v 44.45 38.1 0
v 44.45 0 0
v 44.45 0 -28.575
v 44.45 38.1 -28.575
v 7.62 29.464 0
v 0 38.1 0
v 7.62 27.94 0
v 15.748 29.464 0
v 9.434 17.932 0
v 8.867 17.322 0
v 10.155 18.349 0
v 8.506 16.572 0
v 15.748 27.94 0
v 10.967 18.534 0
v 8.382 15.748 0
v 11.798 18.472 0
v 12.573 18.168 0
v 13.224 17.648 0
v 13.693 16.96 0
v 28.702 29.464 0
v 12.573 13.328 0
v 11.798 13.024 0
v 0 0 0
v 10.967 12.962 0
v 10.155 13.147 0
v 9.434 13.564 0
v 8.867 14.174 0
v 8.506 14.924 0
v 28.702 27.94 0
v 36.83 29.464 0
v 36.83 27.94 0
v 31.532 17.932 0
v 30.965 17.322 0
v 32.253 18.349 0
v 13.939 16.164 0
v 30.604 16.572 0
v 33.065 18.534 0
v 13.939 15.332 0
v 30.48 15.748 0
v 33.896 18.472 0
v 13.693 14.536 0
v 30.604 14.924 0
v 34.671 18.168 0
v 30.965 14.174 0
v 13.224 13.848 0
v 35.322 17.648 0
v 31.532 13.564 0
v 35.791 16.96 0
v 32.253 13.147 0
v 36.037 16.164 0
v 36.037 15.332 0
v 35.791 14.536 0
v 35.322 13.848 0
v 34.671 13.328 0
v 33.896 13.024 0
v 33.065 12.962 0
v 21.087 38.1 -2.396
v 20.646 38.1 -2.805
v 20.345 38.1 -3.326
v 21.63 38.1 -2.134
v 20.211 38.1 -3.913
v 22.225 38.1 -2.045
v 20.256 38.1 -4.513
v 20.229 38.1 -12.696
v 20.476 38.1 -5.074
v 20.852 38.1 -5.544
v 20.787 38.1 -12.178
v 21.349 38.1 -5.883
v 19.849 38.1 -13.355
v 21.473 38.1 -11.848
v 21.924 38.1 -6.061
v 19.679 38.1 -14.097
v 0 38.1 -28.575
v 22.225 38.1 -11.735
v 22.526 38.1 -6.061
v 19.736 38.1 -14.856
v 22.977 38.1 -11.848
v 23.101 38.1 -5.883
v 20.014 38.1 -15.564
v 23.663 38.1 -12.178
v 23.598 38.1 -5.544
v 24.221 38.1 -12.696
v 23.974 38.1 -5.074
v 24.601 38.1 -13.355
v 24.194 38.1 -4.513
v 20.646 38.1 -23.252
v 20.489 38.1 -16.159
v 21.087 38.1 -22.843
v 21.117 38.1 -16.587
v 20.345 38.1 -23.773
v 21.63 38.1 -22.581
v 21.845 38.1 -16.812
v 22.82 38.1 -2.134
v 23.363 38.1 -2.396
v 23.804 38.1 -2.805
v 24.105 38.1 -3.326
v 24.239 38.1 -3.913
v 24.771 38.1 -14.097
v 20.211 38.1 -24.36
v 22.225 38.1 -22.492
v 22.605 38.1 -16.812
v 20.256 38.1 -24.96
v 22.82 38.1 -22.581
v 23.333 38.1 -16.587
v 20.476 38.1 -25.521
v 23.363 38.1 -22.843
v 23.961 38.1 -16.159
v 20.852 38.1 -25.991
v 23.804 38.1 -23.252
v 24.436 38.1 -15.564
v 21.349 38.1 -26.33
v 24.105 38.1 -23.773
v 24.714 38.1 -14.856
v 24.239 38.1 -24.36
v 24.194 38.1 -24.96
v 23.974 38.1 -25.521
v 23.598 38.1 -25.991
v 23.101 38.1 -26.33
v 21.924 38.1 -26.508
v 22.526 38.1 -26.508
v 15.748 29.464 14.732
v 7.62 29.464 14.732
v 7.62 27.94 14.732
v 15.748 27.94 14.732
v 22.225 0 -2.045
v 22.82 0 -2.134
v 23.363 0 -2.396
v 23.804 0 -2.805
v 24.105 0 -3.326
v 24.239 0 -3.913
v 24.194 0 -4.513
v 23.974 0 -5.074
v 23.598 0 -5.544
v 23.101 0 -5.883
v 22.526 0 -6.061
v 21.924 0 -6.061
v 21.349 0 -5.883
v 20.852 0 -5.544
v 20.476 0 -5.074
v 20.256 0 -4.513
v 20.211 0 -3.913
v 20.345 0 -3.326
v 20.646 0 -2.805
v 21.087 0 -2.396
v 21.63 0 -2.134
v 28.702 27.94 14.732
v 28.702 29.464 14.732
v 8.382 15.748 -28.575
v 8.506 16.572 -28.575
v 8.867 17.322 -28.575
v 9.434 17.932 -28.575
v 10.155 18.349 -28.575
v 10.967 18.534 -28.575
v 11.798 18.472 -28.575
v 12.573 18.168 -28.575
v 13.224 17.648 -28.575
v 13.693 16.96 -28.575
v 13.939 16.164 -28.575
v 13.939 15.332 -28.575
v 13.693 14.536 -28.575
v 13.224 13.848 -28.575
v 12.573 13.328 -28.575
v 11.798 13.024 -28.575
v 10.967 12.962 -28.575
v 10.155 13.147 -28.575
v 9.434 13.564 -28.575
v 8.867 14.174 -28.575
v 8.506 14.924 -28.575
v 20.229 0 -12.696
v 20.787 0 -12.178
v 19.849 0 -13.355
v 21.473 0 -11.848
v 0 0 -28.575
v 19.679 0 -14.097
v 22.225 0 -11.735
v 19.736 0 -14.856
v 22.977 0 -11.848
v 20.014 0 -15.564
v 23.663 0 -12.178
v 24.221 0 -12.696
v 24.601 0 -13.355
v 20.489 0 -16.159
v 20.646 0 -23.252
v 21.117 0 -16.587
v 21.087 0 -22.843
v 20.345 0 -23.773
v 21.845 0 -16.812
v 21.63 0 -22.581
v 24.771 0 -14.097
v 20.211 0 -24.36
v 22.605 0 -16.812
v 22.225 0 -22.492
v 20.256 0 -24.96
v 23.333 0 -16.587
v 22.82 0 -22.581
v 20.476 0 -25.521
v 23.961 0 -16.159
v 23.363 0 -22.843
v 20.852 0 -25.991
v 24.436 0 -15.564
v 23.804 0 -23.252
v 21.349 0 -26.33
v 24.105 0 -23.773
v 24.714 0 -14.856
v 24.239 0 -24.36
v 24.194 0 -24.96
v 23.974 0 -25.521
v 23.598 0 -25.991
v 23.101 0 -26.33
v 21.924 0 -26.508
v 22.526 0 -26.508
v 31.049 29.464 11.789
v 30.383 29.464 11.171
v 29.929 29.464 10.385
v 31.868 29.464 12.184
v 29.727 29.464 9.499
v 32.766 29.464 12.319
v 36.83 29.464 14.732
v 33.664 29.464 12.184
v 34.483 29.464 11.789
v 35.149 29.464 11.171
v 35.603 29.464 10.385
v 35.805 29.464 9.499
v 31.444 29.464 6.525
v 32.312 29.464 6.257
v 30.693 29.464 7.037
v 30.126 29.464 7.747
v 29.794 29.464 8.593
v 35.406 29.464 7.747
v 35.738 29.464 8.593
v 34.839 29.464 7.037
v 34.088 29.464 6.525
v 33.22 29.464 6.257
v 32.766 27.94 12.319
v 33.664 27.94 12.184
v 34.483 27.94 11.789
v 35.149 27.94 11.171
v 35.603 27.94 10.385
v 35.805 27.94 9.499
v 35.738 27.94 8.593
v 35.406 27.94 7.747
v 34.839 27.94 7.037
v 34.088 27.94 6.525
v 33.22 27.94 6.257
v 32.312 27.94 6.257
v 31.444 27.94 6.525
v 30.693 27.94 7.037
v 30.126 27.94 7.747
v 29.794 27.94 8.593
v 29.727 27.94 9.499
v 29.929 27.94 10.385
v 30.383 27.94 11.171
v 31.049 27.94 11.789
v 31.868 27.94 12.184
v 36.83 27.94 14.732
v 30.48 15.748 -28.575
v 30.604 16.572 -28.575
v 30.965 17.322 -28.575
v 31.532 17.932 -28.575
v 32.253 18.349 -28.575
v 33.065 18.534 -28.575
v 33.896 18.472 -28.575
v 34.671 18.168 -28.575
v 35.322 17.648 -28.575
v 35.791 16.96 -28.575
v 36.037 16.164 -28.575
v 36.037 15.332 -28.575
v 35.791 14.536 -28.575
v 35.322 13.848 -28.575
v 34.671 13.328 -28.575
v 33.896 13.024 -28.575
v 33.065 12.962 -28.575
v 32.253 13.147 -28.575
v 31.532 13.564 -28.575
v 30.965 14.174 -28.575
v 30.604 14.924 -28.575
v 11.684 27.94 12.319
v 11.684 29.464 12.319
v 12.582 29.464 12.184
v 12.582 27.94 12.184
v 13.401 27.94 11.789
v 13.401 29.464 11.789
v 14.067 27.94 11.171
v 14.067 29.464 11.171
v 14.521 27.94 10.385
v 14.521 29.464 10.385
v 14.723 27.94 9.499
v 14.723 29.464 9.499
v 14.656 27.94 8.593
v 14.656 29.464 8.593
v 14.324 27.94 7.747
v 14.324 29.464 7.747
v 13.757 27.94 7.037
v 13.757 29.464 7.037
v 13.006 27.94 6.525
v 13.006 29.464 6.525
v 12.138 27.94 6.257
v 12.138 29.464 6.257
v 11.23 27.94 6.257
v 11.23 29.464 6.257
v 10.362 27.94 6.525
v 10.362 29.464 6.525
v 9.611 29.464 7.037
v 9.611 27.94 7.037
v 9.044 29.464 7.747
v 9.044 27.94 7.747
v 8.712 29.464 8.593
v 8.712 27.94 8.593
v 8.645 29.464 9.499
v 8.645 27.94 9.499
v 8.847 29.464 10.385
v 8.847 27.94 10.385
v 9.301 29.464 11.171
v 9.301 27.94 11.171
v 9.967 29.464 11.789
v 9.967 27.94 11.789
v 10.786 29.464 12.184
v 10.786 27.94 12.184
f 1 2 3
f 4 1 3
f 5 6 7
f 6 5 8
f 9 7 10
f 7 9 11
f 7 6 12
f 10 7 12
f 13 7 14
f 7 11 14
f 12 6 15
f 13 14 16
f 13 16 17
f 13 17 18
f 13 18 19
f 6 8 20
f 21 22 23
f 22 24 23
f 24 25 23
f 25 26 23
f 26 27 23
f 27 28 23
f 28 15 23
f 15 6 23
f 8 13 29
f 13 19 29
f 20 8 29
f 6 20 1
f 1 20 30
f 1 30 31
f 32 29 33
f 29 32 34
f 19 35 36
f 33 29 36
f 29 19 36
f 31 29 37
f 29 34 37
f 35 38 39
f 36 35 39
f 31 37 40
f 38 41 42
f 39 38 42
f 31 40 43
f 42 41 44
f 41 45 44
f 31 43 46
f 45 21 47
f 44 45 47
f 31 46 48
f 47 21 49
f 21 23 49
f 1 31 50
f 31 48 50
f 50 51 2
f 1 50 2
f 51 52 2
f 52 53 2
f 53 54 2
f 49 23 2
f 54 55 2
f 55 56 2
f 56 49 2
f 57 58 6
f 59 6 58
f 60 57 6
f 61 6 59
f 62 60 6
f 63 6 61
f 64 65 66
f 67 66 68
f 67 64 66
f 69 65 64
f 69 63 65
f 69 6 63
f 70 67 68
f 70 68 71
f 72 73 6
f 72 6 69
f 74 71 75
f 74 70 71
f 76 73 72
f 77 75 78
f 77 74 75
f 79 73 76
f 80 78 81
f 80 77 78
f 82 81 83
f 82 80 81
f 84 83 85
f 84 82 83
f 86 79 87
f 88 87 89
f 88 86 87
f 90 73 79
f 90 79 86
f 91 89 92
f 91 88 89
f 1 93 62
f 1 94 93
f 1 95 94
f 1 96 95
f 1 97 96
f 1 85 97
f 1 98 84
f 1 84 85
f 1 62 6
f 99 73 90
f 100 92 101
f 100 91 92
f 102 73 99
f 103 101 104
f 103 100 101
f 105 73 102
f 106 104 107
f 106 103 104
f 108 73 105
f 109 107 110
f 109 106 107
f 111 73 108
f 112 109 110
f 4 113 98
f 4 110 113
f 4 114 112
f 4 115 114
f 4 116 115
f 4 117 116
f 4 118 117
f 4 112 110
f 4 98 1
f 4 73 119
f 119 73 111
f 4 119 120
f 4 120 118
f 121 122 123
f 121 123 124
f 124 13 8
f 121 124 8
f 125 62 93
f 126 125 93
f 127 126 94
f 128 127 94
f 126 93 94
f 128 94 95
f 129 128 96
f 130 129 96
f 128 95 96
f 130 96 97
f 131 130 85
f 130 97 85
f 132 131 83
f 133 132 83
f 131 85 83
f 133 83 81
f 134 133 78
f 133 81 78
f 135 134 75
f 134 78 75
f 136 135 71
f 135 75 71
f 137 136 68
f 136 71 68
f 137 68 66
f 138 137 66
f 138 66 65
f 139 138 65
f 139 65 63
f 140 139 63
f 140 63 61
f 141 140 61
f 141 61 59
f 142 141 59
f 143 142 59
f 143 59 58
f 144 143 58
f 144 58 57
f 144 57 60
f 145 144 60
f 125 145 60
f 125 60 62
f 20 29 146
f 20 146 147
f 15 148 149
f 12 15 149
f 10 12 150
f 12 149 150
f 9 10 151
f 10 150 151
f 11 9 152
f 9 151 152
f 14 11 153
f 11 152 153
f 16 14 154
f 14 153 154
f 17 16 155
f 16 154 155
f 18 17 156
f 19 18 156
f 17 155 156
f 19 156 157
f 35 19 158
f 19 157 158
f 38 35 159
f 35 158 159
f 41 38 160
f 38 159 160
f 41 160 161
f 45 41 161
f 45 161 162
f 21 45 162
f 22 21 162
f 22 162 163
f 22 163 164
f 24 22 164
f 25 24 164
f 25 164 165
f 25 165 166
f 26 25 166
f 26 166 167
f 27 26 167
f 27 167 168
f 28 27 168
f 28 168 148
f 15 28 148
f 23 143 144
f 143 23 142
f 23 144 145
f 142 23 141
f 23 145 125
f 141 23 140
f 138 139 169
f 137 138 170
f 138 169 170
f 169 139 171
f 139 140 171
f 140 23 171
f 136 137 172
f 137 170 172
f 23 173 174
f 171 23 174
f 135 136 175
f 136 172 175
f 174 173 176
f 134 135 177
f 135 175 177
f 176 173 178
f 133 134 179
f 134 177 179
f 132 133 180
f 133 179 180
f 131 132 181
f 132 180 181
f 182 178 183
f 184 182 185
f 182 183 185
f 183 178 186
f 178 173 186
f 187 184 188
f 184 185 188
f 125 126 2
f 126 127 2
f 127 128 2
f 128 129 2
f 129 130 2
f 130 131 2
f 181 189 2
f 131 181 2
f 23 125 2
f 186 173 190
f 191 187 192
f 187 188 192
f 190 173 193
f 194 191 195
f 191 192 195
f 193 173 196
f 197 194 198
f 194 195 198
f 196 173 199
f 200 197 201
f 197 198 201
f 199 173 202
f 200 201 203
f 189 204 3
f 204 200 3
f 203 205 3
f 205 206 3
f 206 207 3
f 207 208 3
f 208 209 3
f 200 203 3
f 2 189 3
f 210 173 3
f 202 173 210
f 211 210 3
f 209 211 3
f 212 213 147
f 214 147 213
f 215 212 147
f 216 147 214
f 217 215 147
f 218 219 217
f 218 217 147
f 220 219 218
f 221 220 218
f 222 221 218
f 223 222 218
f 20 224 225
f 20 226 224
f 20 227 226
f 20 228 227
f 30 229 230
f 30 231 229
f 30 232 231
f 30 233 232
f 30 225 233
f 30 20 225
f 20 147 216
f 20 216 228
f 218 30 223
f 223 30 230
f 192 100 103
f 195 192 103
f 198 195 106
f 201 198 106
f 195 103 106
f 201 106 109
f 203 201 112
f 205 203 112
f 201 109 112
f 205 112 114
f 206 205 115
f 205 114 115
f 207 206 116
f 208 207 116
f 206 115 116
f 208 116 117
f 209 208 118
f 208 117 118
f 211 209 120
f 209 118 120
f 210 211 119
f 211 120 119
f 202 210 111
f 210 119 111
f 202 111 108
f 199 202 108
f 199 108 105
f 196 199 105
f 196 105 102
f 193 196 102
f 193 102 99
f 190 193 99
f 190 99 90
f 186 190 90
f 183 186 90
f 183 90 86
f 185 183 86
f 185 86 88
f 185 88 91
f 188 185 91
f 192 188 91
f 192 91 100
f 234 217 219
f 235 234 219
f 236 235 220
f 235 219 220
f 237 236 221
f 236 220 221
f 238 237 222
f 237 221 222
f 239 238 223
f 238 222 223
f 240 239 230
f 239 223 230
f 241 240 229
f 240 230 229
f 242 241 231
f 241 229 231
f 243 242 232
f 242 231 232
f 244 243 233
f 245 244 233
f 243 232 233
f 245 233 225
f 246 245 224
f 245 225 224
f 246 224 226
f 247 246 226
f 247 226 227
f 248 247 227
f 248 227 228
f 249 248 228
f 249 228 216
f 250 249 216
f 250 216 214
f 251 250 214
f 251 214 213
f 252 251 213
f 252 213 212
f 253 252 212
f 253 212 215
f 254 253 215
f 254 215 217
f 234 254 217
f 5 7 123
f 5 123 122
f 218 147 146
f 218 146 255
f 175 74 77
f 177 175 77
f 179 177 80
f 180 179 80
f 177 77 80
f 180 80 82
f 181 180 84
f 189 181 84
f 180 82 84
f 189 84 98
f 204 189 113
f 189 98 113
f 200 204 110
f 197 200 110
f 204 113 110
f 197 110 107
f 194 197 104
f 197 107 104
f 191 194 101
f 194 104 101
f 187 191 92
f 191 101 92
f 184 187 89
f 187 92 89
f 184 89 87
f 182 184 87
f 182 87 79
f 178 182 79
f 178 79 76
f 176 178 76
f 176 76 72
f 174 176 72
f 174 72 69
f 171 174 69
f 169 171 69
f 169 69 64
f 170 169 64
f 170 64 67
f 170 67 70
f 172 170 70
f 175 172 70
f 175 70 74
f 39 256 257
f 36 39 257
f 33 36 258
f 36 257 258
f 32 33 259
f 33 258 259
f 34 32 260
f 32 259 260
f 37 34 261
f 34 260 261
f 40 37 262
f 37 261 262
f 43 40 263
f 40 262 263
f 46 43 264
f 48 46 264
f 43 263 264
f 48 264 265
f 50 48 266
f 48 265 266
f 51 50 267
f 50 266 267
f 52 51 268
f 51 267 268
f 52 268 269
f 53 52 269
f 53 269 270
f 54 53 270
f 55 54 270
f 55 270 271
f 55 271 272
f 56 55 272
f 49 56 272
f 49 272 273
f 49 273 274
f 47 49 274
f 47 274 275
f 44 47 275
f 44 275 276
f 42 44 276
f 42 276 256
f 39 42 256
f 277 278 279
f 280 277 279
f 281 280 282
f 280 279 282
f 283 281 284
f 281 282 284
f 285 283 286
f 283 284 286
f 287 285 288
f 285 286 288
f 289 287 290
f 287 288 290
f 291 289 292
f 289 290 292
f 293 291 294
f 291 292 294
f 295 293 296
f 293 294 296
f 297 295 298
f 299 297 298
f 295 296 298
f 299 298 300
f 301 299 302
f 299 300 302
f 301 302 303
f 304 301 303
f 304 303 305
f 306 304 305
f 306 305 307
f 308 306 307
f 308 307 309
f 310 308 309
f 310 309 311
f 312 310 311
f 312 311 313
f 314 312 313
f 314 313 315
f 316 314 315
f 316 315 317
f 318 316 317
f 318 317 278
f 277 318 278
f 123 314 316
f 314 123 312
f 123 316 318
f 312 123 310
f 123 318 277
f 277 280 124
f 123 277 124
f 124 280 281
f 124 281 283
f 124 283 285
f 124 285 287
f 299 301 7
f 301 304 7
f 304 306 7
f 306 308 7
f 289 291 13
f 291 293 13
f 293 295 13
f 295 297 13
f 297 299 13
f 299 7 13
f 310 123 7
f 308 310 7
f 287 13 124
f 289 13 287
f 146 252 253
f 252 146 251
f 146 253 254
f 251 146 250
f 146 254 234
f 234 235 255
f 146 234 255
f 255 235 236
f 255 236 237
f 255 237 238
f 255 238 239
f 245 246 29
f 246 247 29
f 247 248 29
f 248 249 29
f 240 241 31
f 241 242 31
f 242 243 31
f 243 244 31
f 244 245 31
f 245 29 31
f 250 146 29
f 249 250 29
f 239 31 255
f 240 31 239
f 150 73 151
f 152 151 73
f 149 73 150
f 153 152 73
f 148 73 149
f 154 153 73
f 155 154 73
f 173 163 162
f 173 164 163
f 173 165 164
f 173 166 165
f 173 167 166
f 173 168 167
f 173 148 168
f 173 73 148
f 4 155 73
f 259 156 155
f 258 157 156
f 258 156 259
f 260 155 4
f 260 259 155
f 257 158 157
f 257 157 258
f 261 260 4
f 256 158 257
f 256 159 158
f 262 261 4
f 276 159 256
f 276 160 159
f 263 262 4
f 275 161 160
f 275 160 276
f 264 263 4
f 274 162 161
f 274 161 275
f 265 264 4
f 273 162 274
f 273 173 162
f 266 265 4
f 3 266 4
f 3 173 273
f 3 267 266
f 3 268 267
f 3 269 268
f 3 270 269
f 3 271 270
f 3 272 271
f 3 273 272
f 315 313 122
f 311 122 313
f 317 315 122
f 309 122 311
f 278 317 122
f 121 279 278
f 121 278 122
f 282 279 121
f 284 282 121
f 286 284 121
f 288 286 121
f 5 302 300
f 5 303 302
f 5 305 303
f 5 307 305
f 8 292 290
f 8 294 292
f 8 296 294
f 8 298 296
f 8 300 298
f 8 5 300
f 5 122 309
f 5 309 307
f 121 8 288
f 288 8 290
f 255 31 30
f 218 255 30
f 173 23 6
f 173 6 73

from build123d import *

# Parameters (mm, degrees)
SKETCH1_W          = 44.45
SKETCH1_H          = 28.575
EXTRUDE1_DEPTH     = 38.1
SKETCH2_R          = 2.5527
SKETCH2_R_2        = 2.0193
CUT_EXTRUDE1_DEPTH = 66.145553379
SKETCH3_R          = 2.794
CUT_EXTRUDE2_DEPTH = 66.145553379
SKETCH4_W          = 8.128
SKETCH4_H          = 1.524
EXTRUDE2_DEPTH     = 14.732
SKETCH5_R          = 3.048
CUT_EXTRUDE3_DEPTH = 61.501738992


with BuildPart() as part:
    # Sketch1 → Extrude1 (new body)
    with BuildSketch(Plane(origin=(0, 0, 0), x_dir=(1, 0, 0), z_dir=(0, 1, 0))):
        with Locations((22.225, 14.2875)):
            Rectangle(SKETCH1_W, SKETCH1_H)
    extrude(amount=EXTRUDE1_DEPTH)

    # Sketch2 → Cut-Extrude1 (cut, through all)
    with BuildSketch(Plane(origin=(0, 38.1, 0), x_dir=(-1, 0, 0), z_dir=(0, 1, 0))):
        with Locations(Location((-22.225, -14.2875, 0), (0, 0, 90))):
            Circle(SKETCH2_R)
        with Locations(Location((-22.225, -24.511, 0), (0, 0, 90))):
            Circle(SKETCH2_R_2)
        with Locations(Location((-22.225, -4.064, 0), (0, 0, 90))):
            Circle(SKETCH2_R_2)
    extrude(amount=-CUT_EXTRUDE1_DEPTH, mode=Mode.SUBTRACT)

    # Sketch3 → Cut-Extrude2 (cut, through all)
    with BuildSketch(Plane(origin=(0, 0, -28.575), x_dir=(-1, 0, 0), z_dir=(0, 0, -1))):
        with Locations((-33.274, 15.748)):
            Circle(SKETCH3_R)
        with Locations((-11.176, 15.748)):
            Circle(SKETCH3_R)
    extrude(amount=-CUT_EXTRUDE2_DEPTH, mode=Mode.SUBTRACT)

    # Sketch4 → Extrude2 (add)
    with BuildSketch(Plane.XY):
        with Locations((11.684, 28.702)):
            Rectangle(SKETCH4_W, SKETCH4_H)
        with Locations((32.766, 28.702)):
            Rectangle(SKETCH4_W, SKETCH4_H)
    extrude(amount=EXTRUDE2_DEPTH)

    # Sketch5 → Cut-Extrude3 (cut, through all)
    with BuildSketch(Plane(origin=(0, 29.464, 0), x_dir=(-1, 0, 0), z_dir=(0, 1, 0))):
        with Locations(Location((-11.684, 9.271, 0), (0, 0, 90))):
            Circle(SKETCH5_R)
        with Locations(Location((-32.766, 9.271, 0), (0, 0, 90))):
            Circle(SKETCH5_R)
    extrude(amount=-CUT_EXTRUDE3_DEPTH, mode=Mode.SUBTRACT)


solid = part.part
